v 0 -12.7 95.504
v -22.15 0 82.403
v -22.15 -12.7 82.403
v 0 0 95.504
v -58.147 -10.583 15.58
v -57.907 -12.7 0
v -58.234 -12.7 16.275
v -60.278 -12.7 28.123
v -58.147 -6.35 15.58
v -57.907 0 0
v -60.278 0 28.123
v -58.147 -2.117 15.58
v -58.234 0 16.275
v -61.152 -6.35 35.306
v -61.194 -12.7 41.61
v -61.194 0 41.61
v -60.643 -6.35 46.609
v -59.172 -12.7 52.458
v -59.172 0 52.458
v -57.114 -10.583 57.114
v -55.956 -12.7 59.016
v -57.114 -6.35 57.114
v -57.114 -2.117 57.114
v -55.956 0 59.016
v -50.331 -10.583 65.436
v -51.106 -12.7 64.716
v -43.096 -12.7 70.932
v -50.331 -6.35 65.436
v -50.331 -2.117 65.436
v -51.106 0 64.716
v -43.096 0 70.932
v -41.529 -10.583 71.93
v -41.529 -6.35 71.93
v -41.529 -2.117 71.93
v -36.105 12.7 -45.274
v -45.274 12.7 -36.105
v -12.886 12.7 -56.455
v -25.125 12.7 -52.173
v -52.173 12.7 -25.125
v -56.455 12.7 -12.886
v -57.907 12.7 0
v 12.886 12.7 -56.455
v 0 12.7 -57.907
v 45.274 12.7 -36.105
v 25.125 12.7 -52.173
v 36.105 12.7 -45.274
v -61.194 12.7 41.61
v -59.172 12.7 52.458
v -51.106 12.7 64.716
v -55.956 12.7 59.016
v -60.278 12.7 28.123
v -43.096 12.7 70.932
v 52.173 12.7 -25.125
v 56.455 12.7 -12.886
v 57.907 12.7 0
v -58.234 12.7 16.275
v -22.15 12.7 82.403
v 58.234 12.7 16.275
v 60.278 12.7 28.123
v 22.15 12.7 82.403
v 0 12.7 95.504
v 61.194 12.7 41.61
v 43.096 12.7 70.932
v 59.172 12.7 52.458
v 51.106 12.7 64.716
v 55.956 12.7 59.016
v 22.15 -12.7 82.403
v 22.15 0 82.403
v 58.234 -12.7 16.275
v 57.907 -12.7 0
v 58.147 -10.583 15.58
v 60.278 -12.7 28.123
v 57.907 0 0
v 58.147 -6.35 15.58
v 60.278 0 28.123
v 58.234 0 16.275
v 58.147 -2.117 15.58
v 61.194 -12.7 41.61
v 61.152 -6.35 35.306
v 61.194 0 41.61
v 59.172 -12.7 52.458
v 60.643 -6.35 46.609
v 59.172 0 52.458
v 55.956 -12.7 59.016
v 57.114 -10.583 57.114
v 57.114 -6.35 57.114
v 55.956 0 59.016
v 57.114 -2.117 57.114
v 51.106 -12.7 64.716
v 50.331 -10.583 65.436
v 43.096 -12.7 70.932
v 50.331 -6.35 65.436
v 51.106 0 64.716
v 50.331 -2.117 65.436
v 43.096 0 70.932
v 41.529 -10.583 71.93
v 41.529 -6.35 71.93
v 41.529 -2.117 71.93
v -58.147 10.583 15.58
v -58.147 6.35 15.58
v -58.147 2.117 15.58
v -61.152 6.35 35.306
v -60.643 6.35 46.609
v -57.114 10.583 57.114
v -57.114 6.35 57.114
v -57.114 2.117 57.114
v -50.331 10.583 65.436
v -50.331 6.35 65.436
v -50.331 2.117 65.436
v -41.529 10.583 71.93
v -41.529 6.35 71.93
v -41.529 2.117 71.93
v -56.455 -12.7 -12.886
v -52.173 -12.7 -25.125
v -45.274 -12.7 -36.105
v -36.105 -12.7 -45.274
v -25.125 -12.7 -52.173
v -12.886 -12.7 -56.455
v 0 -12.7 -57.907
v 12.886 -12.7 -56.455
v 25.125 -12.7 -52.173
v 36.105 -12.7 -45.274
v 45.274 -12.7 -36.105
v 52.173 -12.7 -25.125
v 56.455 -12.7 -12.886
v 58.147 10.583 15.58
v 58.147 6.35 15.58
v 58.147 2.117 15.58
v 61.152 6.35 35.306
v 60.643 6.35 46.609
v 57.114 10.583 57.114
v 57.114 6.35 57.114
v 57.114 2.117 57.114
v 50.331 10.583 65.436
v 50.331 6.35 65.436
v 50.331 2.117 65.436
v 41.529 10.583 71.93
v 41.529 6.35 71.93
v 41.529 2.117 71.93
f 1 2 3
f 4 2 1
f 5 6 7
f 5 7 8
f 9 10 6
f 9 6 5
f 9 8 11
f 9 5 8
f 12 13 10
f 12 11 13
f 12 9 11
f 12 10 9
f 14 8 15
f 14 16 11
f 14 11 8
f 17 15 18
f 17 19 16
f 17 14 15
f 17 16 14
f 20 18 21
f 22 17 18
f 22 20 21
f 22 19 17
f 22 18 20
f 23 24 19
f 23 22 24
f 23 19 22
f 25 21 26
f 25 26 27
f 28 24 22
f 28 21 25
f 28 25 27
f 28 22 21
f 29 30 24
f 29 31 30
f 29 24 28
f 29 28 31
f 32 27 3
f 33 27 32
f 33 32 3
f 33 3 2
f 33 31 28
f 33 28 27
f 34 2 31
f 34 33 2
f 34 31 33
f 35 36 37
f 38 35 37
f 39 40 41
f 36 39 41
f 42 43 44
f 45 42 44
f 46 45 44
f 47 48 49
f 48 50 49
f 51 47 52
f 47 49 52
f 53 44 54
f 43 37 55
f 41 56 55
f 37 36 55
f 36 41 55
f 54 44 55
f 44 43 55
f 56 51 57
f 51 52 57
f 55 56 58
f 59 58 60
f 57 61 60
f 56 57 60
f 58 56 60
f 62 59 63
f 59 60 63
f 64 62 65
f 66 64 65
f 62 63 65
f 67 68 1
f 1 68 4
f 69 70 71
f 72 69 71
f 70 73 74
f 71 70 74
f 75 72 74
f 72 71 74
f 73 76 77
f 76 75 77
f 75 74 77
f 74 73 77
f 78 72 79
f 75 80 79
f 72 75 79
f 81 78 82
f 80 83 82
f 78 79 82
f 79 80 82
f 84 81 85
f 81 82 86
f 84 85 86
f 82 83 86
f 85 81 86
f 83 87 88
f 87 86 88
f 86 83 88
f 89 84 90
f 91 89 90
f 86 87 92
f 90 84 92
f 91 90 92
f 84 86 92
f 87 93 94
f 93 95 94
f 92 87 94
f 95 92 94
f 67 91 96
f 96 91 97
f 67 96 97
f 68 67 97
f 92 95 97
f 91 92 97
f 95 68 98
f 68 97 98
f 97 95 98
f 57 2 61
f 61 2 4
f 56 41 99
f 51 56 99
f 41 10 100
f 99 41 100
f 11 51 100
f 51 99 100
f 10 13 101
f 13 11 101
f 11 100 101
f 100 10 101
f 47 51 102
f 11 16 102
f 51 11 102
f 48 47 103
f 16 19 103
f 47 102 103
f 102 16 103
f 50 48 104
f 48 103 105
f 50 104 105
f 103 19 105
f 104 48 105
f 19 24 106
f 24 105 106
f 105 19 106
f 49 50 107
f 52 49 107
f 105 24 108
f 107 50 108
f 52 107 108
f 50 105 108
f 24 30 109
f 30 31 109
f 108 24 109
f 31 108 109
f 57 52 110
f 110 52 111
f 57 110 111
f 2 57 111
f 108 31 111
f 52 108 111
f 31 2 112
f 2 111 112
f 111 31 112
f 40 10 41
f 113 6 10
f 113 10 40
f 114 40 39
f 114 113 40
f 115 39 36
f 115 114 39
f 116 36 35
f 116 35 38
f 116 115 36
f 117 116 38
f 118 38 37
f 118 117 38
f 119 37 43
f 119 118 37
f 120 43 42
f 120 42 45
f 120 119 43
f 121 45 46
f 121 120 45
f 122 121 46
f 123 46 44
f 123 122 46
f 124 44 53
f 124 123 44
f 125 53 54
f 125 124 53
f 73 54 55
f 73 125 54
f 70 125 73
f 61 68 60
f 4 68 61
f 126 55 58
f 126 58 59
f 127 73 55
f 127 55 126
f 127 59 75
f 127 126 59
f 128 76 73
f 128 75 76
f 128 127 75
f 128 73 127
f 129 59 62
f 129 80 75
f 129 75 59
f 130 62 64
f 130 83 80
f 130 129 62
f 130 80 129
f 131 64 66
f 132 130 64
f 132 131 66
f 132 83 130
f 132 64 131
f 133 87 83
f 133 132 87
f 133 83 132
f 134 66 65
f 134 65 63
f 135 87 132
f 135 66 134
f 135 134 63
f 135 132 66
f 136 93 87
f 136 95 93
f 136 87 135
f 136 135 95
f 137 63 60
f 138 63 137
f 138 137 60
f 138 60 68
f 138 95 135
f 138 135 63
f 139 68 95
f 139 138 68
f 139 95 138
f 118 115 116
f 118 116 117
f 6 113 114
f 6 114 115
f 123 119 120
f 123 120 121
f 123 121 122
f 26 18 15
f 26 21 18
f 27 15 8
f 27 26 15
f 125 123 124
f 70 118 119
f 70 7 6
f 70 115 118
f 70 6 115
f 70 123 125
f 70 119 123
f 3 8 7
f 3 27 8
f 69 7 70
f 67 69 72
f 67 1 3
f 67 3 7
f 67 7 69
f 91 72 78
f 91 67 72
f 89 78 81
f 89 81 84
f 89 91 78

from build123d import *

# Parameters (mm, degrees)
F1_DEPTH = 12.7


with BuildPart() as f1:
    # F0 (on Front) → F1 (new body, symmetric)
    with BuildSketch(Plane.XZ):
        with BuildLine():
            ThreePointArc((-57.9073168337, 0), (0, -57.9073168337), (57.9073168337, 0))
            add(Edge.make_bspline(
                [(57.9073168337, 0), (57.7035928826, 5.0836857421), (57.2764841542, 15.9200002784), (62.591224193, 35.1555711006), (59.6648907409, 58.6163574282), (41.6811280162, 72.8568929301), (21.7803366448, 82.0664074952), (7.4388819921, 90.9145052404), (0, 95.504)],
                knots=[0, 0, 0, 0, 0.1433978074, 0.3056661676, 0.4767459335, 0.6452017867, 0.8159666021, 1, 1, 1, 1], degree=3))
            add(Edge.make_bspline(
                [(-57.9073168337, 0), (-57.7035928826, 5.0836857421), (-57.2764841542, 15.9200002784), (-62.591224193, 35.1555711006), (-59.6648907409, 58.6163574282), (-41.6811280162, 72.8568929301), (-21.7803366448, 82.0664074952), (-7.4388819921, 90.9145052404), (0, 95.504)],
                knots=[0, 0, 0, 0, 0.1433978074, 0.3056661676, 0.4767459335, 0.6452017867, 0.8159666021, 1, 1, 1, 1], degree=3))
        make_face()
    extrude(amount=F1_DEPTH, both=True)


solid = f1.part
